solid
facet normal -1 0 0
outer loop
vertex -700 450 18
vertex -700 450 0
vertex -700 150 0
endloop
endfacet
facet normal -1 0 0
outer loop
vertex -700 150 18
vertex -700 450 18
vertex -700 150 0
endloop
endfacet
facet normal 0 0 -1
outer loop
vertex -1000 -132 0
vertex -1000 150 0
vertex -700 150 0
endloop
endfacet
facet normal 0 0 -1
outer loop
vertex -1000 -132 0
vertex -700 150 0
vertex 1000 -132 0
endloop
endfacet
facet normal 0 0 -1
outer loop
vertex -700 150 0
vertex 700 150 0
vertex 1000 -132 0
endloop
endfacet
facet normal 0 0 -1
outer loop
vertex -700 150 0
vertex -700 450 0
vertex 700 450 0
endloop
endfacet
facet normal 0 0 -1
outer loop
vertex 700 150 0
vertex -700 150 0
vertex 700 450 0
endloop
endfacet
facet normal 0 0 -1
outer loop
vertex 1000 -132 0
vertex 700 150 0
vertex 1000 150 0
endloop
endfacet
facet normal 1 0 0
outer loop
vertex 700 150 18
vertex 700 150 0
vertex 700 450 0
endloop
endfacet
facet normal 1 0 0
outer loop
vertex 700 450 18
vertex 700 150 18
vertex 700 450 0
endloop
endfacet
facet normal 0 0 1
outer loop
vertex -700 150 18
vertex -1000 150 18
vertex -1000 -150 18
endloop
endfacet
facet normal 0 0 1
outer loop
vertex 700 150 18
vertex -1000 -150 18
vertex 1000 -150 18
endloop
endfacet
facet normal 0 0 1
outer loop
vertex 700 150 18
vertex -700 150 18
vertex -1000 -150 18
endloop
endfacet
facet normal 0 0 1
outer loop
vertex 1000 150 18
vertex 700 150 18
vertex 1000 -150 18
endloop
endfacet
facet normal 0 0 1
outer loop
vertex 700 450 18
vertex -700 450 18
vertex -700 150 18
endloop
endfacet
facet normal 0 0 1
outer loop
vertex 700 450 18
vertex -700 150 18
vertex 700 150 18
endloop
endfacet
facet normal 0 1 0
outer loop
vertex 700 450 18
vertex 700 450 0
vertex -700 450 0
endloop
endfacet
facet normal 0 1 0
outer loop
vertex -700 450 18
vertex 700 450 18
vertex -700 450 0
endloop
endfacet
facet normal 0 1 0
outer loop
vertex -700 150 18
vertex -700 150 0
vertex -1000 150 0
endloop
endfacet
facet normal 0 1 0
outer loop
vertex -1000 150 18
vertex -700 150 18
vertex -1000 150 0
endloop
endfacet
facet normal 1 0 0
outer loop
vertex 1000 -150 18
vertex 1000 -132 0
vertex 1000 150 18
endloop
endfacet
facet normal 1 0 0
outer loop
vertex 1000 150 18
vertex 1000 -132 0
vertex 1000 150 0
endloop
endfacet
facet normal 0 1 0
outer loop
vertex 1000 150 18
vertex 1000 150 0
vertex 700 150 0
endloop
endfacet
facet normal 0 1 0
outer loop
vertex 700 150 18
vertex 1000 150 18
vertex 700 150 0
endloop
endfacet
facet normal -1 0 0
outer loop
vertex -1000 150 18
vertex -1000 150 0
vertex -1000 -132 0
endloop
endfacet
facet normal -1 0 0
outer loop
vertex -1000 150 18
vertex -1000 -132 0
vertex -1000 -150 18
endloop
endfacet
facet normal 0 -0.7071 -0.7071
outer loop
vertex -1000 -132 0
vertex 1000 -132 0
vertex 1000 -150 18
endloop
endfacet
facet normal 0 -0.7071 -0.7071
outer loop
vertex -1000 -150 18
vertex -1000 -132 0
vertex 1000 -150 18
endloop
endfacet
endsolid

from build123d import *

# Parameters (mm, degrees)
F1_DEPTH = 18
F3_DEPTH = 2000


with BuildPart() as f1:
    # F0 (on Top) → F1 (new body)
    with BuildSketch(Plane.XY):
        Polygon((1000, -150), (1000, 150), (700, 150), (700, 450), (-700, 450), (-700, 150), (-1000, 150), (-1000, -150), align=None)
    extrude(amount=F1_DEPTH)

    # F2 (on face) → F3 (cut)
    with BuildSketch(Plane.YZ.offset(1000)):
        Polygon((-132, 0), (-150, 18), (-150, 0), align=None)
    extrude(amount=-F3_DEPTH, mode=Mode.SUBTRACT)


solid = f1.part
